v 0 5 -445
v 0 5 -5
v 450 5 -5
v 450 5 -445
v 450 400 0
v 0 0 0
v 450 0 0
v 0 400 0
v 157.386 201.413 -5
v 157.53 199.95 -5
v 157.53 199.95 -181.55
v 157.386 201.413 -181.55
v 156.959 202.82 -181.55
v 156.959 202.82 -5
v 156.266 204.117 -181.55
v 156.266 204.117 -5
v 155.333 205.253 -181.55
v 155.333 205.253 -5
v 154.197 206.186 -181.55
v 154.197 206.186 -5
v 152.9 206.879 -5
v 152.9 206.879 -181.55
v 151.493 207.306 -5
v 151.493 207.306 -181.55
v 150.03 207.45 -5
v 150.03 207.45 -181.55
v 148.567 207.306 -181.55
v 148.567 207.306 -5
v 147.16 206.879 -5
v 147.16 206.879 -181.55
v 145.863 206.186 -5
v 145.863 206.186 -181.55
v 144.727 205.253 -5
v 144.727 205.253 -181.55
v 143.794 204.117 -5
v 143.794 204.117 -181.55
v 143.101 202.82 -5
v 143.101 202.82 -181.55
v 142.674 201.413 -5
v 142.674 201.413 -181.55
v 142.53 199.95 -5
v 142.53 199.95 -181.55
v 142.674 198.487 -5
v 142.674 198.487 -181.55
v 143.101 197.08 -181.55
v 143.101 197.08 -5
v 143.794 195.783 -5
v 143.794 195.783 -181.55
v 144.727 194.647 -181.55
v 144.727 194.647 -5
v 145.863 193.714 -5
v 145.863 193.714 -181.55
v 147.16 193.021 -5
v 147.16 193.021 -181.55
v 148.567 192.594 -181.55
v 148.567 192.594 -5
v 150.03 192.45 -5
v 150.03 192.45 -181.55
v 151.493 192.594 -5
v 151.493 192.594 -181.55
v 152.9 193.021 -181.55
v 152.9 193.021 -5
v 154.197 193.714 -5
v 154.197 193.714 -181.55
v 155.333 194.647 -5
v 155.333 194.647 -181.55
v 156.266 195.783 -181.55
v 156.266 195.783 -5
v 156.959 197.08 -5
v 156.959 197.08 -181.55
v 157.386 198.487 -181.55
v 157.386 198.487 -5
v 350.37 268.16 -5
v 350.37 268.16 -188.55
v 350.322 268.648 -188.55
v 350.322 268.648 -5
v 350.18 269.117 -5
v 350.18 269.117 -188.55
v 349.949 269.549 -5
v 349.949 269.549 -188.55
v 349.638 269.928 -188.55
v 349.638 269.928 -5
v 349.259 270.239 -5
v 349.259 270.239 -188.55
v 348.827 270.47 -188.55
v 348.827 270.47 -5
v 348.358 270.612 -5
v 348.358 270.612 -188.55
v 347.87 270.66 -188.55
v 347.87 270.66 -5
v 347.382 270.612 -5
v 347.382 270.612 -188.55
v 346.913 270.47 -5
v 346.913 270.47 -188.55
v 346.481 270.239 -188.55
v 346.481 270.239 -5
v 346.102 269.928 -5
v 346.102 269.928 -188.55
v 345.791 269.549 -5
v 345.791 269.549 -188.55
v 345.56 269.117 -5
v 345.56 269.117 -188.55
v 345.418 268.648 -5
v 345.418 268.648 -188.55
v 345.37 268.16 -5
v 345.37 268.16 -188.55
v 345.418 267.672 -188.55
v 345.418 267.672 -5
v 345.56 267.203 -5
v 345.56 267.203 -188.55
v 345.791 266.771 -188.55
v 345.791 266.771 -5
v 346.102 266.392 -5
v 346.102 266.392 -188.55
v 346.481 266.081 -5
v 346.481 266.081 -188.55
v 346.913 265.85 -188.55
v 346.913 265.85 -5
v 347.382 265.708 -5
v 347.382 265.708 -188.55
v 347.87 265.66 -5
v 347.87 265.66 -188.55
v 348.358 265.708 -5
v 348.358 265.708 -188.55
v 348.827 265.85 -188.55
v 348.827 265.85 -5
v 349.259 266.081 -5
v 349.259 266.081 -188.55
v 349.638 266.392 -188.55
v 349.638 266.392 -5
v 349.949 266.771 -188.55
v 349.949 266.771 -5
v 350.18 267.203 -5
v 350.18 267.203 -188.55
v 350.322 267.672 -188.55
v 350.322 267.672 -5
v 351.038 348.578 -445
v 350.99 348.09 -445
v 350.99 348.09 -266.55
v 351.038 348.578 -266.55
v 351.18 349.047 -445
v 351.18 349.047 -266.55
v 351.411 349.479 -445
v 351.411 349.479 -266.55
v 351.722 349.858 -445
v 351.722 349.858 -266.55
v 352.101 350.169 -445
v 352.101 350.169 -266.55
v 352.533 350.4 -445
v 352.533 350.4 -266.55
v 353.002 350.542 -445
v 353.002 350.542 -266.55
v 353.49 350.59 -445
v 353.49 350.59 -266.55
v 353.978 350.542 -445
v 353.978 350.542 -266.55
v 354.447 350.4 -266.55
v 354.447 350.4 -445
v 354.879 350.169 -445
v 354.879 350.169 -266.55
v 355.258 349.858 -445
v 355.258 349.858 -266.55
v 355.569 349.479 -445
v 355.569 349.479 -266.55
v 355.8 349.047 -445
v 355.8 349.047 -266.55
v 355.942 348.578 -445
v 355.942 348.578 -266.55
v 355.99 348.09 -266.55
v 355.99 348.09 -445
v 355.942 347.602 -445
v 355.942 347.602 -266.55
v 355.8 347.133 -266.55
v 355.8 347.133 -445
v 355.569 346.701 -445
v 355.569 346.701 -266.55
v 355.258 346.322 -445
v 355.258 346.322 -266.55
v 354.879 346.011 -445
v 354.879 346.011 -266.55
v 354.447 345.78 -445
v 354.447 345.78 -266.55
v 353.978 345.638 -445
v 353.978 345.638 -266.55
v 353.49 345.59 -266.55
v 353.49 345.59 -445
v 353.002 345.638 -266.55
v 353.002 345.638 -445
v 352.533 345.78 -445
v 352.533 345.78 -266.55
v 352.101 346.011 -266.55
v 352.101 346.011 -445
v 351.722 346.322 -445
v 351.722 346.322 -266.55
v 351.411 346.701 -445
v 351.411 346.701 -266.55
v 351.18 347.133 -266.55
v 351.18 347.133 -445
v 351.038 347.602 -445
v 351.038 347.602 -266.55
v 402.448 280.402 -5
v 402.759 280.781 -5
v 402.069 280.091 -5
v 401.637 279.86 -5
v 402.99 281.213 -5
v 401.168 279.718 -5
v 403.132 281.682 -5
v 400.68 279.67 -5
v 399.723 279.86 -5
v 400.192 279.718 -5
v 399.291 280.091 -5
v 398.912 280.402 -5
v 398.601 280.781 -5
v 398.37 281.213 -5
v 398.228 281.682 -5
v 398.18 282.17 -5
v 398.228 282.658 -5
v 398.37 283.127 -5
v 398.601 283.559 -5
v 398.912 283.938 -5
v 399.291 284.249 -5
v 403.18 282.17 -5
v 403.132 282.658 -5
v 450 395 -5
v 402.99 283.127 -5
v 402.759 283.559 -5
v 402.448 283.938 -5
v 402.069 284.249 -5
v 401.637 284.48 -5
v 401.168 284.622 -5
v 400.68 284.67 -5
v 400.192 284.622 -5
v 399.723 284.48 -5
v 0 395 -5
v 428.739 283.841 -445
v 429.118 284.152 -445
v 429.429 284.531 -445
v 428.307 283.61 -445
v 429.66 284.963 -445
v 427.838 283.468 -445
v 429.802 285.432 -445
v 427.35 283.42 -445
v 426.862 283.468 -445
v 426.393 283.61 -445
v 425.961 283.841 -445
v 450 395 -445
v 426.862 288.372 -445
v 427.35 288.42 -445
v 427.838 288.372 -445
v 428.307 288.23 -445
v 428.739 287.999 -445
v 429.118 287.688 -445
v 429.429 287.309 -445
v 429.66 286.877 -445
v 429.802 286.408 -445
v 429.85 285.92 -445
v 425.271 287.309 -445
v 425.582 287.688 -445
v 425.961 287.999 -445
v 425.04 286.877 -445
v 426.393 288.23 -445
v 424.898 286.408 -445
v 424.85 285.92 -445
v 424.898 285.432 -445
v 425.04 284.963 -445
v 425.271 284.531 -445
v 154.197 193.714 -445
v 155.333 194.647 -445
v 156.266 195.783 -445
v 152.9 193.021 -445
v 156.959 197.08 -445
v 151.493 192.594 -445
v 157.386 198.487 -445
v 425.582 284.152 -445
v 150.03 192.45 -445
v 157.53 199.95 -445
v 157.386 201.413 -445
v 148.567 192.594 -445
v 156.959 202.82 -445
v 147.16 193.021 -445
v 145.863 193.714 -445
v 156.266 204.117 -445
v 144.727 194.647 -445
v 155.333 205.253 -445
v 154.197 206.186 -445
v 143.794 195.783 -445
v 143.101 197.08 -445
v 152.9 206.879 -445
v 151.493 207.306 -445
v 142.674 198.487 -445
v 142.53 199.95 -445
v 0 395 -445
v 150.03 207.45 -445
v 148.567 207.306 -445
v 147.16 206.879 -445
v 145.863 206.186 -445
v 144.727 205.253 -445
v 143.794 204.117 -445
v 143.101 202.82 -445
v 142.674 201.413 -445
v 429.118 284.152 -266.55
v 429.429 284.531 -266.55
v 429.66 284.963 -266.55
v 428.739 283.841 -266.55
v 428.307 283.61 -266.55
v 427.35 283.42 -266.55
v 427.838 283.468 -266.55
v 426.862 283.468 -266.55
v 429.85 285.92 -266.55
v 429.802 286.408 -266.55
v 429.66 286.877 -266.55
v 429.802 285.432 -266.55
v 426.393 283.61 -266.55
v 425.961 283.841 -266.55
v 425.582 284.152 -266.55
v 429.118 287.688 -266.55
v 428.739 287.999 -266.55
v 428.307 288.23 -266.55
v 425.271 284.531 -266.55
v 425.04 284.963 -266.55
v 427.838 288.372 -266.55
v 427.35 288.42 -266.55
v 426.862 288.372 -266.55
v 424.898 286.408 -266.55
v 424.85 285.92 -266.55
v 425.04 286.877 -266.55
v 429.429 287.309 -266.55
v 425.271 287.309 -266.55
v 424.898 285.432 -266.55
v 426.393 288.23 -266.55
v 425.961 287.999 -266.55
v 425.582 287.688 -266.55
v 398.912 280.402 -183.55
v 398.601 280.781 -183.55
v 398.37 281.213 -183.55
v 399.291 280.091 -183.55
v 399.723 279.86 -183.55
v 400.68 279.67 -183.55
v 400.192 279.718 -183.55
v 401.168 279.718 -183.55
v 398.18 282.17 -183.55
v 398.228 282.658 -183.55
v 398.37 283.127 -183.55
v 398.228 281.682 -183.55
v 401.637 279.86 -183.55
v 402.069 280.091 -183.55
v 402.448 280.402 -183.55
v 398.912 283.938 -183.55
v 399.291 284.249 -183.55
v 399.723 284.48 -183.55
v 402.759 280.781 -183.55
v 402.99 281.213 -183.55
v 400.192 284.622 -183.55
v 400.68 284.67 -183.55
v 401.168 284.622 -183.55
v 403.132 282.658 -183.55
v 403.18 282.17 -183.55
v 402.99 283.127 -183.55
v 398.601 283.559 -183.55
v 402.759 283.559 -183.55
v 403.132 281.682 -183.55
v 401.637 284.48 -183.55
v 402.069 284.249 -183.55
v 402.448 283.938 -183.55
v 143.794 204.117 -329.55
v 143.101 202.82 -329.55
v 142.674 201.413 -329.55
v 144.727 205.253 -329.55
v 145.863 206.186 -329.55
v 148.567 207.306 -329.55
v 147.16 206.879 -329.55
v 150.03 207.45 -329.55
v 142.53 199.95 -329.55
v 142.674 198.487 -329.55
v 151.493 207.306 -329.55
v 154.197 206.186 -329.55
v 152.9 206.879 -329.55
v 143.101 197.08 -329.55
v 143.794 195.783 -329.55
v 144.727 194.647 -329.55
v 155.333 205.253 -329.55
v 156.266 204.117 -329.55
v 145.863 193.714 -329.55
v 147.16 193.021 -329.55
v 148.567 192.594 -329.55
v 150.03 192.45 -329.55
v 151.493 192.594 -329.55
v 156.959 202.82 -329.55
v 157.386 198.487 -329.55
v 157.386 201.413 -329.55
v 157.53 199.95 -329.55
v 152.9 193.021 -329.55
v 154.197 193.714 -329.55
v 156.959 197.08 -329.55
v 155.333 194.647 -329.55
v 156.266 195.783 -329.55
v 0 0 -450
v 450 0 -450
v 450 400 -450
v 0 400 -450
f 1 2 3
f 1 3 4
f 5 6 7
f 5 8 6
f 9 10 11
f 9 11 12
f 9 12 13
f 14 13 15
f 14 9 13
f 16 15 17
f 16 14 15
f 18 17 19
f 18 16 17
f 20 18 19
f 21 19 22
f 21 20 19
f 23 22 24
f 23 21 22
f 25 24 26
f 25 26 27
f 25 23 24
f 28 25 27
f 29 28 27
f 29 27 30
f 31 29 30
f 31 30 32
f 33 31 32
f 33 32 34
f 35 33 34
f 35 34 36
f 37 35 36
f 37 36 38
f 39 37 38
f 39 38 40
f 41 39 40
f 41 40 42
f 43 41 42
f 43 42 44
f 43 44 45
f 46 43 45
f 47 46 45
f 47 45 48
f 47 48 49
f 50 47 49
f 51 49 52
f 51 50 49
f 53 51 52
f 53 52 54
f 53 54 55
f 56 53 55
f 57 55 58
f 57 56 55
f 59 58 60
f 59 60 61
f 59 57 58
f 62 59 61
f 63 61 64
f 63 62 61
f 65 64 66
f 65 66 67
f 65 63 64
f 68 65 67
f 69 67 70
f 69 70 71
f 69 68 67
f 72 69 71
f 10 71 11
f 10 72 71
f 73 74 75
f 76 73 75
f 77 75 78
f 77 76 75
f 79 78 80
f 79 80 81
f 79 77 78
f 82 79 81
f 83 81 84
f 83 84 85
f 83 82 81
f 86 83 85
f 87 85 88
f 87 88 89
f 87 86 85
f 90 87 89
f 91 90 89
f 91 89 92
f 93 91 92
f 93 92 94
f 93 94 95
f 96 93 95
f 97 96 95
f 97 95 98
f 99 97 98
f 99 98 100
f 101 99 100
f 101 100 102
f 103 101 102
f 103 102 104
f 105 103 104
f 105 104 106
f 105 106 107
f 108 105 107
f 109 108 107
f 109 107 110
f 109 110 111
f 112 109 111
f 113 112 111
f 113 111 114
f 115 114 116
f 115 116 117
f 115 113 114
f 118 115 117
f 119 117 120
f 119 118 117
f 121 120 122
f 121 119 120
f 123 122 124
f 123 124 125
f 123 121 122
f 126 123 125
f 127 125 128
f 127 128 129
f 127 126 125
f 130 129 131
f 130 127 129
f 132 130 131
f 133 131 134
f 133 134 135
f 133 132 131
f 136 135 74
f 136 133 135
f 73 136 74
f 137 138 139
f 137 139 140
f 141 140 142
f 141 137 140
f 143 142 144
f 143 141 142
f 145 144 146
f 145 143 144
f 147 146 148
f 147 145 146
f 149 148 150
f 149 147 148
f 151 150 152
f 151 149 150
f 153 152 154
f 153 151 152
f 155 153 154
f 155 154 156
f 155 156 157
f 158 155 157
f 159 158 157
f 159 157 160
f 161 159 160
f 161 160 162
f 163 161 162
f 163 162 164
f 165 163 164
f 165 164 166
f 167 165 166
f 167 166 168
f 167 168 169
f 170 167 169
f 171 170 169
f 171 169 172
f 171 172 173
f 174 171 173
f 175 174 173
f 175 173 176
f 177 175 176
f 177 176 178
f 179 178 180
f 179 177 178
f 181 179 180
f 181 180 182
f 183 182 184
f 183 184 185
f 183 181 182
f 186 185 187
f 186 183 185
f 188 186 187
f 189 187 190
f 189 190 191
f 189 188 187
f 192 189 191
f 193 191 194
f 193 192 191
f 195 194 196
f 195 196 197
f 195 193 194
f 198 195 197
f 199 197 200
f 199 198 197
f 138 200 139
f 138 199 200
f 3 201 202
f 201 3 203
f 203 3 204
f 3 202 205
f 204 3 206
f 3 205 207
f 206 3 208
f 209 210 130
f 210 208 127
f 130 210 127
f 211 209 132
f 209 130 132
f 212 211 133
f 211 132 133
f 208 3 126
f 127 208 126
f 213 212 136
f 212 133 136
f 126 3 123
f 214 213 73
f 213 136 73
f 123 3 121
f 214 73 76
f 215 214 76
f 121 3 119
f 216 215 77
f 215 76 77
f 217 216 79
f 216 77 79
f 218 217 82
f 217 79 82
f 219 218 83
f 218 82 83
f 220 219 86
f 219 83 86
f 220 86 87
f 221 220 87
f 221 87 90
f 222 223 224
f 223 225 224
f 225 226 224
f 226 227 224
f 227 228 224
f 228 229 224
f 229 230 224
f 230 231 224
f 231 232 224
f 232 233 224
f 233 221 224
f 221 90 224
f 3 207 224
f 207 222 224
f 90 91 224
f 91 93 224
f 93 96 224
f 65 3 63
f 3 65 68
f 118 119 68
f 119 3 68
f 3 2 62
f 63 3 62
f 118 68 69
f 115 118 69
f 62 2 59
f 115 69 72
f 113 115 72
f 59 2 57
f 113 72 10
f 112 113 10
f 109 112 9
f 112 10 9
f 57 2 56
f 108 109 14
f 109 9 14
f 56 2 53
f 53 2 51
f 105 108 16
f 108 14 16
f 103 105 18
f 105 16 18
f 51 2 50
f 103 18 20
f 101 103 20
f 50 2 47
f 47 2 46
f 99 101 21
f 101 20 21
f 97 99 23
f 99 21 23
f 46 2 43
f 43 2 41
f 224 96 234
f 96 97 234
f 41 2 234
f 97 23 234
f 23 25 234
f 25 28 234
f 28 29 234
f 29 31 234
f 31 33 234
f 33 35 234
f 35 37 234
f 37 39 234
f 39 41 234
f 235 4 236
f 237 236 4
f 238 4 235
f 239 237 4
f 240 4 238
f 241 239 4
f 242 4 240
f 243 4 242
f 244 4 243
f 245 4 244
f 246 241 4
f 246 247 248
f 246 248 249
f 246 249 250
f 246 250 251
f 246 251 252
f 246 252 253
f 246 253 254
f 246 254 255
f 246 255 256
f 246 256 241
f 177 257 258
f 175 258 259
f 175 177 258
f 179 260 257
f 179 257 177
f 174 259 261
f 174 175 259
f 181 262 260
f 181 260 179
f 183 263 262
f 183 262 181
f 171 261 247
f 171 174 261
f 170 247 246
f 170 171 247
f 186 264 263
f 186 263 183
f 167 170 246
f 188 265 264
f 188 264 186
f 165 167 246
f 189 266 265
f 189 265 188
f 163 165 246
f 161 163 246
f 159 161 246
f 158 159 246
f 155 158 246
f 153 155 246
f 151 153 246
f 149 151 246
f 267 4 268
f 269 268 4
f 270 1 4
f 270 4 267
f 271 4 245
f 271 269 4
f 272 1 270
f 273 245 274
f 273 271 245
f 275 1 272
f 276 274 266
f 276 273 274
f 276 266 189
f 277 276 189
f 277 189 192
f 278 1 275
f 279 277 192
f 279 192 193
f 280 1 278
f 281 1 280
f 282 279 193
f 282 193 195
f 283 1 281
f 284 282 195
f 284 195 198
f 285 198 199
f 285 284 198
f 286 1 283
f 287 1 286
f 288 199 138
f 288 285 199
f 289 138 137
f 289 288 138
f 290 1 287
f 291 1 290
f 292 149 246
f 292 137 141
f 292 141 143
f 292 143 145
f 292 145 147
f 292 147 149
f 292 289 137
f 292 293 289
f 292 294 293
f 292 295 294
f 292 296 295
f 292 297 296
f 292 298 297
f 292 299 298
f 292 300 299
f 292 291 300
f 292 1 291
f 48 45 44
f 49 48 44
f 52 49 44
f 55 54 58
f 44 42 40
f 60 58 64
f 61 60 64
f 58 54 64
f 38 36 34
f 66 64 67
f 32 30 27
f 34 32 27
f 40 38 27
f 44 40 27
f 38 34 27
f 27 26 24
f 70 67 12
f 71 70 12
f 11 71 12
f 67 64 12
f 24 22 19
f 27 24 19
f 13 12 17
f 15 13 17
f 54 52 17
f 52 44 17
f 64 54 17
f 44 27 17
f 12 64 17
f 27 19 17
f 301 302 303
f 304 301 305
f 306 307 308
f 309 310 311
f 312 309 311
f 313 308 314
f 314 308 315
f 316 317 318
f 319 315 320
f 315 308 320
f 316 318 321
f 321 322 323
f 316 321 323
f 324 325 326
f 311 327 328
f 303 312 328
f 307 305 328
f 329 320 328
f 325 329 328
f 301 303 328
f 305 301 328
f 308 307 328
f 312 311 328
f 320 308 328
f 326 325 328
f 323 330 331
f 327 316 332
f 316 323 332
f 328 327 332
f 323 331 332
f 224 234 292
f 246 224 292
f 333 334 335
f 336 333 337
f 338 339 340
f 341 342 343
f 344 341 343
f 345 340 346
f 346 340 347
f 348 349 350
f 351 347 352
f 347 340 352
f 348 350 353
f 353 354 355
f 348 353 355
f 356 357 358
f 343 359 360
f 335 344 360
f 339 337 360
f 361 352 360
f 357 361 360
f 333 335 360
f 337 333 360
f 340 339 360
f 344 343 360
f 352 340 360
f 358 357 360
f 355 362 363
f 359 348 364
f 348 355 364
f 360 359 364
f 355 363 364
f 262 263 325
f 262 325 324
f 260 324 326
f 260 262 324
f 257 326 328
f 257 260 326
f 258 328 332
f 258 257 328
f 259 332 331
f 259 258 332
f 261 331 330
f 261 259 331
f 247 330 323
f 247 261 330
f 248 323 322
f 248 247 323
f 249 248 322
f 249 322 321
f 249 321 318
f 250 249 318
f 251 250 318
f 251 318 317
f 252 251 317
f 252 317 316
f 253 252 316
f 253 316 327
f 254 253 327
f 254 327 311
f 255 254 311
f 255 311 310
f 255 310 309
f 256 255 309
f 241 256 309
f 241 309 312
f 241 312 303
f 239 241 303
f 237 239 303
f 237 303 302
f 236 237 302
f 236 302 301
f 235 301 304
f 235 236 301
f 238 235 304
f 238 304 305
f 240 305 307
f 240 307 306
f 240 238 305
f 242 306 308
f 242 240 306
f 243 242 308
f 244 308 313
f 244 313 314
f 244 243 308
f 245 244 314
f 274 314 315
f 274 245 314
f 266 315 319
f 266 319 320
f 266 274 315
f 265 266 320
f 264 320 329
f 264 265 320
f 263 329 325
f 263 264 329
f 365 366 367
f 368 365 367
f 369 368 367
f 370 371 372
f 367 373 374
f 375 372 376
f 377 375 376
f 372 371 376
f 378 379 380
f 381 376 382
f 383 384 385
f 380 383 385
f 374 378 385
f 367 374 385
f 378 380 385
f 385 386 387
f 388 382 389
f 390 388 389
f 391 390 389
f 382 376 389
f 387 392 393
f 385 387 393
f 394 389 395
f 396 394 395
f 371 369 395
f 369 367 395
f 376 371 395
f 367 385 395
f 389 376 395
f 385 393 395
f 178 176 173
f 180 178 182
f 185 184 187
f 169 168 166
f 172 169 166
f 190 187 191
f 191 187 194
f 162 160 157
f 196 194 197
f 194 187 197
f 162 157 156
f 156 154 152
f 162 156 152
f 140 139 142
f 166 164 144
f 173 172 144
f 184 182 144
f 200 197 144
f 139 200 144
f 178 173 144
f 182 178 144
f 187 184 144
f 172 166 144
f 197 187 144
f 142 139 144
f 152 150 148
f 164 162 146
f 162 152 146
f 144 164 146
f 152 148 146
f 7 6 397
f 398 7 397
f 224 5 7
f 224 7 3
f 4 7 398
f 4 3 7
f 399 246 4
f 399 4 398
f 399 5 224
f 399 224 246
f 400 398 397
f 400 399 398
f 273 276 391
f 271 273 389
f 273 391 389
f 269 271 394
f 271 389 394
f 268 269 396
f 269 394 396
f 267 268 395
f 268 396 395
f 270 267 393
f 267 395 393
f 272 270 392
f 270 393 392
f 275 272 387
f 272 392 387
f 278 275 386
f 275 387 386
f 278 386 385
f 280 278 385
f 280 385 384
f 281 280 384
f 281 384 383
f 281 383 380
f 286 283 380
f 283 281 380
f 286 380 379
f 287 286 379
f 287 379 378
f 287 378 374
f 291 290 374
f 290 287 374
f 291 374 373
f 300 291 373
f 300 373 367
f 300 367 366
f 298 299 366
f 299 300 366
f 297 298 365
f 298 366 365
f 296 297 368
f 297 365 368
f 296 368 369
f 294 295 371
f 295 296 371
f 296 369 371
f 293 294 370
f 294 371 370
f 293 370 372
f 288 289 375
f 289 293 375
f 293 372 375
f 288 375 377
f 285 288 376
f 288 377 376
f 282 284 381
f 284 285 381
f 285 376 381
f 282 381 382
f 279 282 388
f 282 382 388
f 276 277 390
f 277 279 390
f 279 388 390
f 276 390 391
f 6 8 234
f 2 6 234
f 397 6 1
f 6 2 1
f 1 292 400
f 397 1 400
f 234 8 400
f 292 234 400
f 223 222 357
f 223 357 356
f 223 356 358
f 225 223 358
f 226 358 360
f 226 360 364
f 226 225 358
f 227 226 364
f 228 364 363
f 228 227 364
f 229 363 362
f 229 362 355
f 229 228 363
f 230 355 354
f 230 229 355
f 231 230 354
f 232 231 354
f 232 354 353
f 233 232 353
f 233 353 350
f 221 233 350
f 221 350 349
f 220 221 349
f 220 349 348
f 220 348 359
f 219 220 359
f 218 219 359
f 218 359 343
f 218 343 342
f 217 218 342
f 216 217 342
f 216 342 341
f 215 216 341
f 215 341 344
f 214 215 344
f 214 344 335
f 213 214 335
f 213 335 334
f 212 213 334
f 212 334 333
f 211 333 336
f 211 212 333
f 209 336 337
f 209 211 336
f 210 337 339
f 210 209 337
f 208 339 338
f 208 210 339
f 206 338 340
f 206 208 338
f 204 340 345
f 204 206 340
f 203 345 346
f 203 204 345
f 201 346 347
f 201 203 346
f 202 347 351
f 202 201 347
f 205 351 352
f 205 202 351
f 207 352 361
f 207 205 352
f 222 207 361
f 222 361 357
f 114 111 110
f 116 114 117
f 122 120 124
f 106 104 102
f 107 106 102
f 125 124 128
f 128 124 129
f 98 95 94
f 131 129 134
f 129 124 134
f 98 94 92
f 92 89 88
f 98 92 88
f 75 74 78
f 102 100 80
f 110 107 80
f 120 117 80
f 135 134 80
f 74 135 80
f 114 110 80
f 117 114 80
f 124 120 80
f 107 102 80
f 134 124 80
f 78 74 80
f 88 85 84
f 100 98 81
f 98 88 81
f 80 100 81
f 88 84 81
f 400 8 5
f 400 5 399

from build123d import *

# Parameters (mm, degrees)
ESBO_O1_W                = 450
ESBO_O1_H                = 400
ESBO_O1_W_2              = 440
ESBO_O1_H_2              = 390
RESSALTO_EXTRUS_O1_DEPTH = 450
ESBO_O2_R                = 2.5
RESSALTO_EXTRUS_O2_DEPTH = 183.55
ESBO_O2_3_R              = 2.5
RESSALTO_EXTRUS_O3_DEPTH = 188.55
ESBO_O2_4_R              = 7.5
RESSALTO_EXTRUS_O4_DEPTH = 181.55
ESBO_O3_R                = 2.5
RESSALTO_EXTRUS_O5_DEPTH = 183.45
ESBO_O3_3_R              = 2.5
RESSALTO_EXTRUS_O6_DEPTH = 183.45
RESSALTO_EXTRUS_O7_START = -120.45
ESBO_O3_4_R              = 7.5
RESSALTO_EXTRUS_O7_DEPTH = 120.45


with BuildPart() as part:
    # Esboço1 → Ressalto-extrusão1 (new body)
    with BuildSketch(Plane(origin=(0, 0, 0), x_dir=(0, 0, -1), z_dir=(1, 0, 0))):
        with Locations((225, 200)):
            Rectangle(ESBO_O1_W, ESBO_O1_H)
        with Locations((225, 200)):
            Rectangle(ESBO_O1_W_2, ESBO_O1_H_2, mode=Mode.SUBTRACT)
    extrude(amount=RESSALTO_EXTRUS_O1_DEPTH)

    # Esboço2 → Ressalto-extrusão2 (add)
    with BuildSketch(Plane.XY):
        with Locations((400.68, 282.17)):
            Circle(ESBO_O2_R)
    extrude(amount=-RESSALTO_EXTRUS_O2_DEPTH)

    # Esboço2<3> → Ressalto-extrusão3 (add)
    with BuildSketch(Plane.XY):
        with Locations((347.87, 268.16)):
            Circle(ESBO_O2_3_R)
    extrude(amount=-RESSALTO_EXTRUS_O3_DEPTH)

    # Esboço2<4> → Ressalto-extrusão4 (add)
    with BuildSketch(Plane.XY):
        with Locations((150.03, 199.95)):
            Circle(ESBO_O2_4_R)
    extrude(amount=-RESSALTO_EXTRUS_O4_DEPTH)

    # Esboço3 → Ressalto-extrusão5 (add)
    with BuildSketch(Plane(origin=(0, 0, -450), x_dir=(-1, 0, 0), z_dir=(0, 0, -1))):
        with Locations((-427.35, 285.92)):
            Circle(ESBO_O3_R)
    extrude(amount=-RESSALTO_EXTRUS_O5_DEPTH)

    # Esboço3<3> → Ressalto-extrusão6 (add)
    with BuildSketch(Plane(origin=(0, 0, -450), x_dir=(-1, 0, 0), z_dir=(0, 0, -1))):
        with Locations((-353.49, 348.09)):
            Circle(ESBO_O3_3_R)
    extrude(amount=-RESSALTO_EXTRUS_O6_DEPTH)

    # Esboço3<4> → Ressalto-extrusão7 (add)
    with BuildSketch(Plane(origin=(0, 0, -450), x_dir=(-1, 0, 0), z_dir=(0, 0, -1)).offset(RESSALTO_EXTRUS_O7_START)):
        with Locations((-150.03, 199.95)):
            Circle(ESBO_O3_4_R)
    extrude(amount=RESSALTO_EXTRUS_O7_DEPTH)


solid = part.part
